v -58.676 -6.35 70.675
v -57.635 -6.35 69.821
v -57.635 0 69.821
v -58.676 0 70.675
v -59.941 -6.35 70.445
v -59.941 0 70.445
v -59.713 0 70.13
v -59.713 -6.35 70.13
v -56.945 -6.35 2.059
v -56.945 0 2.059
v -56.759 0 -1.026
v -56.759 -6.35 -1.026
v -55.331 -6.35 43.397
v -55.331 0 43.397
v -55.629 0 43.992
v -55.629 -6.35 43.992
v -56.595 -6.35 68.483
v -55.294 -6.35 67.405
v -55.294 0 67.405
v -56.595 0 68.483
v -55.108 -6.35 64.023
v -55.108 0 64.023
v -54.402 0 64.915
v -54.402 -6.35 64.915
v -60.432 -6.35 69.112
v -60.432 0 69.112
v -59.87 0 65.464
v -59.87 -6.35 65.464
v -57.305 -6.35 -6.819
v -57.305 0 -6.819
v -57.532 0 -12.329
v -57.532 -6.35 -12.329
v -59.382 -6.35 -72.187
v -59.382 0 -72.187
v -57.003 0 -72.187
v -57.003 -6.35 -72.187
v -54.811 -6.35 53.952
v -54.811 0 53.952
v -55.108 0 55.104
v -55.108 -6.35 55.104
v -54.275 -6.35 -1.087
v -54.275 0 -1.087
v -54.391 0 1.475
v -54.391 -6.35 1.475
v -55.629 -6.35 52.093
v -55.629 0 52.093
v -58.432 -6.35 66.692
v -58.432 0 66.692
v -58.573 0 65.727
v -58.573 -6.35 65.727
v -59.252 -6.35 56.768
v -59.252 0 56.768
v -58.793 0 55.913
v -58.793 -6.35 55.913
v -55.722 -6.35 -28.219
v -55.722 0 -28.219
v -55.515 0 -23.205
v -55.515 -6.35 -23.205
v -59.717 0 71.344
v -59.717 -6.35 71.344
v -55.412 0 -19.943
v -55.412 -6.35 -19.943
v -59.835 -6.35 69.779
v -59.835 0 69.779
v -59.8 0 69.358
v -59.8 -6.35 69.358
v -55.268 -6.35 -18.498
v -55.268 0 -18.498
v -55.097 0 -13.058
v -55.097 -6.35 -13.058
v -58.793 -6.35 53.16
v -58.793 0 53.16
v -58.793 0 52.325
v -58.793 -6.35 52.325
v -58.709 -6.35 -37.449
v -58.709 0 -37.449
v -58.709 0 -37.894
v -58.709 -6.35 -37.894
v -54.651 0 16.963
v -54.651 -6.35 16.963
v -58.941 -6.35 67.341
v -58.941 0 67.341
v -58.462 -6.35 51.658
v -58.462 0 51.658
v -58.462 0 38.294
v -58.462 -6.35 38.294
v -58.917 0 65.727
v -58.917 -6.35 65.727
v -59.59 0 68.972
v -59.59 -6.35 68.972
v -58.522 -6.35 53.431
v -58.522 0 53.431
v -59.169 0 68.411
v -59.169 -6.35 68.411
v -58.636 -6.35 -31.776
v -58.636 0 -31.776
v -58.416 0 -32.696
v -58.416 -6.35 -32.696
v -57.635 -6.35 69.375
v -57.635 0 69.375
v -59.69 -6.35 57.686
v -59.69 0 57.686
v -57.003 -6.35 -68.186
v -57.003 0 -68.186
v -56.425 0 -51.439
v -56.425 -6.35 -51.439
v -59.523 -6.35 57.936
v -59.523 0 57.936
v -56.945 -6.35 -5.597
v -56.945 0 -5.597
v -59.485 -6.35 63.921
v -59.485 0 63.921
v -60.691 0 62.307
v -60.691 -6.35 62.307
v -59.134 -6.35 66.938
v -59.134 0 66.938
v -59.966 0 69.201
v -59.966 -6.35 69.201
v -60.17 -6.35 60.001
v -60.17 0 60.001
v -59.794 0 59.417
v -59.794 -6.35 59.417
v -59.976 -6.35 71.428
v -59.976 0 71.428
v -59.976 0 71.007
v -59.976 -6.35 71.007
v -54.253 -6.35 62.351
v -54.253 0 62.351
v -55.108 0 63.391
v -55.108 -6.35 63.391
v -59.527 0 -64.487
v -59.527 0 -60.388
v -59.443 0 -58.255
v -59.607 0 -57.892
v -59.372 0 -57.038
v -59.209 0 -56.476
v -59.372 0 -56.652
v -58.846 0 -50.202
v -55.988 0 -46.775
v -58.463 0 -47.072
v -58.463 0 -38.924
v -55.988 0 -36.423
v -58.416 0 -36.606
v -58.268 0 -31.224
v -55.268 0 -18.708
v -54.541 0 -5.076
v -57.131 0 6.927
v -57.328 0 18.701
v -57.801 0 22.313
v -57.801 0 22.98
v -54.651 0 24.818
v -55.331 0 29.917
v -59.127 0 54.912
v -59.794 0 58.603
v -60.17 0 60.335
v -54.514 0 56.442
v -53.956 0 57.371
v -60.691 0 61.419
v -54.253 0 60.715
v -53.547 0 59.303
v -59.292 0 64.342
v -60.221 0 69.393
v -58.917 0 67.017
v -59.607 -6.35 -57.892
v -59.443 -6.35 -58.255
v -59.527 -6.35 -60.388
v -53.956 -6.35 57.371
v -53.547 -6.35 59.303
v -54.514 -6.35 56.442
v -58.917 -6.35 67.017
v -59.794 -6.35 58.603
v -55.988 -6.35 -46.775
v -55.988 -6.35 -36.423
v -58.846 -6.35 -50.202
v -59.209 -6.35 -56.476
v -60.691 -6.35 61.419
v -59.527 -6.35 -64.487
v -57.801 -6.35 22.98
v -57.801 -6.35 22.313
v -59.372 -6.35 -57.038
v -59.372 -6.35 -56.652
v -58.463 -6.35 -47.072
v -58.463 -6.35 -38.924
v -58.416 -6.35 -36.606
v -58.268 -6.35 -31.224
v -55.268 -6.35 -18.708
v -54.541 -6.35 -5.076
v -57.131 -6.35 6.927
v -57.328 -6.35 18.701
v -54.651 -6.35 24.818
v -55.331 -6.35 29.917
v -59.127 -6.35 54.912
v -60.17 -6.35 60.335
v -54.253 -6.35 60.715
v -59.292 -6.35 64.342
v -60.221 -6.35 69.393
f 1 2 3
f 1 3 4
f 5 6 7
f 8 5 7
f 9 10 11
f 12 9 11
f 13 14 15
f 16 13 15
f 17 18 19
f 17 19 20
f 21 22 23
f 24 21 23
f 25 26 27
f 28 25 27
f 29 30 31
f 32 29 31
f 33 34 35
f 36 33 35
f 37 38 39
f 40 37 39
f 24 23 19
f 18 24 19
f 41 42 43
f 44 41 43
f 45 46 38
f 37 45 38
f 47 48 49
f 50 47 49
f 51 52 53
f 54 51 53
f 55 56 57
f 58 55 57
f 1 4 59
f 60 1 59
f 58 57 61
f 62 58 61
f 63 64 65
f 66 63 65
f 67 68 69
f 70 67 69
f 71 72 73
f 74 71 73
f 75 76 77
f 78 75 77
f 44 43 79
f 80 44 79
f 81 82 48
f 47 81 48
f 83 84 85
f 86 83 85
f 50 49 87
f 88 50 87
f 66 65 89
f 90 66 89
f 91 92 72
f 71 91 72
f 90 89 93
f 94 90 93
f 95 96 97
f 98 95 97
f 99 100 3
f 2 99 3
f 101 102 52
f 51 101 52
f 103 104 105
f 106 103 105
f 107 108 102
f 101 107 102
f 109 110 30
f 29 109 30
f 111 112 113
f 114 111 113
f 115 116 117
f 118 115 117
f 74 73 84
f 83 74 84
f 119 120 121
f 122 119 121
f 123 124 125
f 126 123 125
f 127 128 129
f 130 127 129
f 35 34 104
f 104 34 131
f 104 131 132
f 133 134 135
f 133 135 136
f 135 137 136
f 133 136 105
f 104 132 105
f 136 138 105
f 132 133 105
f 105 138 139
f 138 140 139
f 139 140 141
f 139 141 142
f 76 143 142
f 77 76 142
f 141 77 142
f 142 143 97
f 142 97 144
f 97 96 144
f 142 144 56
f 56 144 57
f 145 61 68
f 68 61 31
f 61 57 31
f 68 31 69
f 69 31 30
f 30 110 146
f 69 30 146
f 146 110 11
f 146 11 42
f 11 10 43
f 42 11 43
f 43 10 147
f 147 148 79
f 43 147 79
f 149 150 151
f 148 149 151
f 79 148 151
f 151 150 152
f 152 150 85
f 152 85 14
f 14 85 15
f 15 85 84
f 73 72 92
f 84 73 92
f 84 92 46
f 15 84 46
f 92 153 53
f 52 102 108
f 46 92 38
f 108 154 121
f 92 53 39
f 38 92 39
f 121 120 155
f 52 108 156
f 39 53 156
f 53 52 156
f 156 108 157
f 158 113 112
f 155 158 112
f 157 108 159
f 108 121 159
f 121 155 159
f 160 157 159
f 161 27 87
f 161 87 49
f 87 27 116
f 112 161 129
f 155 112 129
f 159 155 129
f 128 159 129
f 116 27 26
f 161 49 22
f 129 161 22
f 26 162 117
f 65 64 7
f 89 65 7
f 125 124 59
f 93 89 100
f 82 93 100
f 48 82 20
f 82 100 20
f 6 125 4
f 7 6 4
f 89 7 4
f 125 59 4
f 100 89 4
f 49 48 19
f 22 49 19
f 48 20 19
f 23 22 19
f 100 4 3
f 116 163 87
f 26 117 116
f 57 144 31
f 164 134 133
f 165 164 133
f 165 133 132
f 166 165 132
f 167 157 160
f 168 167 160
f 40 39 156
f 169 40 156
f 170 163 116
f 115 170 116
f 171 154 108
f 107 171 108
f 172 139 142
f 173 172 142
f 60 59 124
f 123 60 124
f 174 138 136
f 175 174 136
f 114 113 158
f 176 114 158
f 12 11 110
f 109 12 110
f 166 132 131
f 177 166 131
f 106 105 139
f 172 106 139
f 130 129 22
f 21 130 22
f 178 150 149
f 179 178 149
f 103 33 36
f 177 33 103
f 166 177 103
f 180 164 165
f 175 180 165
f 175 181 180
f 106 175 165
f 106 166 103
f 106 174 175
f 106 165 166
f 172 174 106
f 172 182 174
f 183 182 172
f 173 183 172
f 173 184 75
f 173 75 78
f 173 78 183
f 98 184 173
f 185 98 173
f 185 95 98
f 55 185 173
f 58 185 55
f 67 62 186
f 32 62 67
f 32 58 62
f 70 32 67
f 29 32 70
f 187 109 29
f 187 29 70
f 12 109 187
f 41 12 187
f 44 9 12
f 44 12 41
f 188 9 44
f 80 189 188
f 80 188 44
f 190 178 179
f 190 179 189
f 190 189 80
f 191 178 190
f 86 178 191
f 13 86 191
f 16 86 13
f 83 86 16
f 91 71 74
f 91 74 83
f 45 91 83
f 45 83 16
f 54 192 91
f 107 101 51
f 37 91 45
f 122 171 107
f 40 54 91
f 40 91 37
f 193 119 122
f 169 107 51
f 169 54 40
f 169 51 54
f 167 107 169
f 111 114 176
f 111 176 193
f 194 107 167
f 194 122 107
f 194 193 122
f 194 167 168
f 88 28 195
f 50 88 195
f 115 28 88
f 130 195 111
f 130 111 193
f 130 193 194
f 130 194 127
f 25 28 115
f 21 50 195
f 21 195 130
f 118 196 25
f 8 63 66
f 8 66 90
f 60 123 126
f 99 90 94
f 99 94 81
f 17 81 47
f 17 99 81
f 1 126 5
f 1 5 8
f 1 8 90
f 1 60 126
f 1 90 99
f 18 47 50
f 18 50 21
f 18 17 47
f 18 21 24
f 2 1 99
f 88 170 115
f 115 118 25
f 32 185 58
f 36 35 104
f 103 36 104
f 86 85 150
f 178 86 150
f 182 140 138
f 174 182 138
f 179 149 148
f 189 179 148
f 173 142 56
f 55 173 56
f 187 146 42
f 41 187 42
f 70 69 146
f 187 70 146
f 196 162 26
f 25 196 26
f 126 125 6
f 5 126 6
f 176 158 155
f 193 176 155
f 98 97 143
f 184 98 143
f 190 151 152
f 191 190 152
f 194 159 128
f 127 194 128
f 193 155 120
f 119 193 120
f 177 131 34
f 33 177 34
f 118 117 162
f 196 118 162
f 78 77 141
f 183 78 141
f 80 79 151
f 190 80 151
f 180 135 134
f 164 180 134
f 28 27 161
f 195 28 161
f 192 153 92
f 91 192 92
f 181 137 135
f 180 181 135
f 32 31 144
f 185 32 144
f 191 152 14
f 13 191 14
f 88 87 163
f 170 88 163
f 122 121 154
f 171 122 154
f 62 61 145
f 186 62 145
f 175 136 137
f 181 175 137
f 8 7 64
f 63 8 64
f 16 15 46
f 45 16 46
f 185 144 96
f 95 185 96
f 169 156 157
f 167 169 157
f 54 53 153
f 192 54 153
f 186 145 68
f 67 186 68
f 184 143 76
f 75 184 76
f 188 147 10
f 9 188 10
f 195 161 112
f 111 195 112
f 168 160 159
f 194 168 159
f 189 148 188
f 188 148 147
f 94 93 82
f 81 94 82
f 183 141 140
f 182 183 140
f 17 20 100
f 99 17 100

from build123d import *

# Parameters (mm, degrees)
F1_DEPTH = 6.35


with BuildPart() as f1:
    # F0 (on Front) → F1 (new body)
    with BuildSketch(Plane.XZ):
        Polygon((-58.676012, 70.675433), (-59.716608, 71.344383), (-59.975654, 71.427517), (-59.975654, 71.006581), (-59.940577, 70.445329), (-59.71257, 70.129625), (-59.835345, 69.778845), (-59.800263, 69.357902), (-59.589796, 68.972044), (-59.168857, 68.410791), (-58.940846, 67.340903), (-58.432214, 66.691957), (-58.572527, 65.727308), (-58.917451, 65.727308), (-58.917451, 66.639341), (-58.917451, 67.017012), (-59.133779, 66.937506), (-59.965832, 69.201457), (-60.221203, 69.392987), (-60.431674, 69.11236), (-59.870422, 65.464221), (-59.291631, 64.341716), (-59.48456, 63.920781), (-60.690984, 62.307183), (-60.690984, 61.419144), (-60.169544, 60.334548), (-60.169544, 60.000826), (-59.794106, 59.416812), (-59.794106, 58.603365), (-59.522957, 57.93592), (-59.68982, 57.685629), (-59.251808, 56.767892), (-58.792941, 55.912729), (-59.126664, 54.911561), (-58.521792, 53.430669), (-58.792941, 53.15952), (-58.792941, 52.325215), (-58.462251, 51.65777), (-58.462251, 51.219761), (-58.462251, 43.550201), (-58.462251, 38.294077), (-57.80109, 22.979558), (-57.80109, 22.313071), (-57.328186, 18.700593), (-57.130594, 6.927098), (-56.944776, 2.058604), (-56.758955, -1.026015), (-56.944776, -5.597197), (-57.304534, -6.819496), (-57.532188, -12.329374), (-58.267996, -31.223956), (-58.635905, -31.775814), (-58.415901, -32.695577), (-58.415901, -36.606416), (-58.708549, -37.449244), (-58.708549, -37.89407), (-58.462724, -38.924195), (-58.462724, -47.071535), (-58.845624, -50.201591), (-59.208509, -56.475982), (-59.372392, -56.65157), (-59.372392, -57.037868), (-59.606511, -57.892401), (-59.442628, -58.255285), (-59.52654, -60.387559), (-59.52654, -64.487077), (-59.382007, -72.18682), (-57.002816, -72.18682), (-57.002816, -71.950309), (-57.002816, -68.186022), (-56.425326, -51.439133), (-55.987526, -46.775039), (-55.987526, -36.422912), (-55.72189, -28.219488), (-55.514717, -23.205277), (-55.412289, -19.943317), (-55.267755, -18.708207), (-55.267755, -18.497974), (-55.096943, -13.058227), (-54.540541, -5.07562), (-54.275367, -1.08695), (-54.39074, 1.474799), (-54.650679, 16.963238), (-54.650679, 24.818346), (-55.331245, 29.917276), (-55.331245, 34.031644), (-55.331245, 43.396994), (-55.628557, 43.991618), (-55.628557, 50.941303), (-55.628557, 52.09339), (-54.810949, 53.951591), (-55.10826, 55.103678), (-54.513637, 56.441586), (-53.956173, 57.370689), (-53.547371, 59.30322), (-54.253489, 60.715456), (-54.253489, 61.012767), (-54.253489, 62.350675), (-55.10826, 63.391268), (-55.10826, 64.023063), (-54.402143, 64.914994), (-55.294082, 67.404993), (-56.594826, 68.482749), (-57.635419, 69.374688), (-57.635419, 69.820657), align=None)
    extrude(amount=F1_DEPTH)


solid = f1.part
